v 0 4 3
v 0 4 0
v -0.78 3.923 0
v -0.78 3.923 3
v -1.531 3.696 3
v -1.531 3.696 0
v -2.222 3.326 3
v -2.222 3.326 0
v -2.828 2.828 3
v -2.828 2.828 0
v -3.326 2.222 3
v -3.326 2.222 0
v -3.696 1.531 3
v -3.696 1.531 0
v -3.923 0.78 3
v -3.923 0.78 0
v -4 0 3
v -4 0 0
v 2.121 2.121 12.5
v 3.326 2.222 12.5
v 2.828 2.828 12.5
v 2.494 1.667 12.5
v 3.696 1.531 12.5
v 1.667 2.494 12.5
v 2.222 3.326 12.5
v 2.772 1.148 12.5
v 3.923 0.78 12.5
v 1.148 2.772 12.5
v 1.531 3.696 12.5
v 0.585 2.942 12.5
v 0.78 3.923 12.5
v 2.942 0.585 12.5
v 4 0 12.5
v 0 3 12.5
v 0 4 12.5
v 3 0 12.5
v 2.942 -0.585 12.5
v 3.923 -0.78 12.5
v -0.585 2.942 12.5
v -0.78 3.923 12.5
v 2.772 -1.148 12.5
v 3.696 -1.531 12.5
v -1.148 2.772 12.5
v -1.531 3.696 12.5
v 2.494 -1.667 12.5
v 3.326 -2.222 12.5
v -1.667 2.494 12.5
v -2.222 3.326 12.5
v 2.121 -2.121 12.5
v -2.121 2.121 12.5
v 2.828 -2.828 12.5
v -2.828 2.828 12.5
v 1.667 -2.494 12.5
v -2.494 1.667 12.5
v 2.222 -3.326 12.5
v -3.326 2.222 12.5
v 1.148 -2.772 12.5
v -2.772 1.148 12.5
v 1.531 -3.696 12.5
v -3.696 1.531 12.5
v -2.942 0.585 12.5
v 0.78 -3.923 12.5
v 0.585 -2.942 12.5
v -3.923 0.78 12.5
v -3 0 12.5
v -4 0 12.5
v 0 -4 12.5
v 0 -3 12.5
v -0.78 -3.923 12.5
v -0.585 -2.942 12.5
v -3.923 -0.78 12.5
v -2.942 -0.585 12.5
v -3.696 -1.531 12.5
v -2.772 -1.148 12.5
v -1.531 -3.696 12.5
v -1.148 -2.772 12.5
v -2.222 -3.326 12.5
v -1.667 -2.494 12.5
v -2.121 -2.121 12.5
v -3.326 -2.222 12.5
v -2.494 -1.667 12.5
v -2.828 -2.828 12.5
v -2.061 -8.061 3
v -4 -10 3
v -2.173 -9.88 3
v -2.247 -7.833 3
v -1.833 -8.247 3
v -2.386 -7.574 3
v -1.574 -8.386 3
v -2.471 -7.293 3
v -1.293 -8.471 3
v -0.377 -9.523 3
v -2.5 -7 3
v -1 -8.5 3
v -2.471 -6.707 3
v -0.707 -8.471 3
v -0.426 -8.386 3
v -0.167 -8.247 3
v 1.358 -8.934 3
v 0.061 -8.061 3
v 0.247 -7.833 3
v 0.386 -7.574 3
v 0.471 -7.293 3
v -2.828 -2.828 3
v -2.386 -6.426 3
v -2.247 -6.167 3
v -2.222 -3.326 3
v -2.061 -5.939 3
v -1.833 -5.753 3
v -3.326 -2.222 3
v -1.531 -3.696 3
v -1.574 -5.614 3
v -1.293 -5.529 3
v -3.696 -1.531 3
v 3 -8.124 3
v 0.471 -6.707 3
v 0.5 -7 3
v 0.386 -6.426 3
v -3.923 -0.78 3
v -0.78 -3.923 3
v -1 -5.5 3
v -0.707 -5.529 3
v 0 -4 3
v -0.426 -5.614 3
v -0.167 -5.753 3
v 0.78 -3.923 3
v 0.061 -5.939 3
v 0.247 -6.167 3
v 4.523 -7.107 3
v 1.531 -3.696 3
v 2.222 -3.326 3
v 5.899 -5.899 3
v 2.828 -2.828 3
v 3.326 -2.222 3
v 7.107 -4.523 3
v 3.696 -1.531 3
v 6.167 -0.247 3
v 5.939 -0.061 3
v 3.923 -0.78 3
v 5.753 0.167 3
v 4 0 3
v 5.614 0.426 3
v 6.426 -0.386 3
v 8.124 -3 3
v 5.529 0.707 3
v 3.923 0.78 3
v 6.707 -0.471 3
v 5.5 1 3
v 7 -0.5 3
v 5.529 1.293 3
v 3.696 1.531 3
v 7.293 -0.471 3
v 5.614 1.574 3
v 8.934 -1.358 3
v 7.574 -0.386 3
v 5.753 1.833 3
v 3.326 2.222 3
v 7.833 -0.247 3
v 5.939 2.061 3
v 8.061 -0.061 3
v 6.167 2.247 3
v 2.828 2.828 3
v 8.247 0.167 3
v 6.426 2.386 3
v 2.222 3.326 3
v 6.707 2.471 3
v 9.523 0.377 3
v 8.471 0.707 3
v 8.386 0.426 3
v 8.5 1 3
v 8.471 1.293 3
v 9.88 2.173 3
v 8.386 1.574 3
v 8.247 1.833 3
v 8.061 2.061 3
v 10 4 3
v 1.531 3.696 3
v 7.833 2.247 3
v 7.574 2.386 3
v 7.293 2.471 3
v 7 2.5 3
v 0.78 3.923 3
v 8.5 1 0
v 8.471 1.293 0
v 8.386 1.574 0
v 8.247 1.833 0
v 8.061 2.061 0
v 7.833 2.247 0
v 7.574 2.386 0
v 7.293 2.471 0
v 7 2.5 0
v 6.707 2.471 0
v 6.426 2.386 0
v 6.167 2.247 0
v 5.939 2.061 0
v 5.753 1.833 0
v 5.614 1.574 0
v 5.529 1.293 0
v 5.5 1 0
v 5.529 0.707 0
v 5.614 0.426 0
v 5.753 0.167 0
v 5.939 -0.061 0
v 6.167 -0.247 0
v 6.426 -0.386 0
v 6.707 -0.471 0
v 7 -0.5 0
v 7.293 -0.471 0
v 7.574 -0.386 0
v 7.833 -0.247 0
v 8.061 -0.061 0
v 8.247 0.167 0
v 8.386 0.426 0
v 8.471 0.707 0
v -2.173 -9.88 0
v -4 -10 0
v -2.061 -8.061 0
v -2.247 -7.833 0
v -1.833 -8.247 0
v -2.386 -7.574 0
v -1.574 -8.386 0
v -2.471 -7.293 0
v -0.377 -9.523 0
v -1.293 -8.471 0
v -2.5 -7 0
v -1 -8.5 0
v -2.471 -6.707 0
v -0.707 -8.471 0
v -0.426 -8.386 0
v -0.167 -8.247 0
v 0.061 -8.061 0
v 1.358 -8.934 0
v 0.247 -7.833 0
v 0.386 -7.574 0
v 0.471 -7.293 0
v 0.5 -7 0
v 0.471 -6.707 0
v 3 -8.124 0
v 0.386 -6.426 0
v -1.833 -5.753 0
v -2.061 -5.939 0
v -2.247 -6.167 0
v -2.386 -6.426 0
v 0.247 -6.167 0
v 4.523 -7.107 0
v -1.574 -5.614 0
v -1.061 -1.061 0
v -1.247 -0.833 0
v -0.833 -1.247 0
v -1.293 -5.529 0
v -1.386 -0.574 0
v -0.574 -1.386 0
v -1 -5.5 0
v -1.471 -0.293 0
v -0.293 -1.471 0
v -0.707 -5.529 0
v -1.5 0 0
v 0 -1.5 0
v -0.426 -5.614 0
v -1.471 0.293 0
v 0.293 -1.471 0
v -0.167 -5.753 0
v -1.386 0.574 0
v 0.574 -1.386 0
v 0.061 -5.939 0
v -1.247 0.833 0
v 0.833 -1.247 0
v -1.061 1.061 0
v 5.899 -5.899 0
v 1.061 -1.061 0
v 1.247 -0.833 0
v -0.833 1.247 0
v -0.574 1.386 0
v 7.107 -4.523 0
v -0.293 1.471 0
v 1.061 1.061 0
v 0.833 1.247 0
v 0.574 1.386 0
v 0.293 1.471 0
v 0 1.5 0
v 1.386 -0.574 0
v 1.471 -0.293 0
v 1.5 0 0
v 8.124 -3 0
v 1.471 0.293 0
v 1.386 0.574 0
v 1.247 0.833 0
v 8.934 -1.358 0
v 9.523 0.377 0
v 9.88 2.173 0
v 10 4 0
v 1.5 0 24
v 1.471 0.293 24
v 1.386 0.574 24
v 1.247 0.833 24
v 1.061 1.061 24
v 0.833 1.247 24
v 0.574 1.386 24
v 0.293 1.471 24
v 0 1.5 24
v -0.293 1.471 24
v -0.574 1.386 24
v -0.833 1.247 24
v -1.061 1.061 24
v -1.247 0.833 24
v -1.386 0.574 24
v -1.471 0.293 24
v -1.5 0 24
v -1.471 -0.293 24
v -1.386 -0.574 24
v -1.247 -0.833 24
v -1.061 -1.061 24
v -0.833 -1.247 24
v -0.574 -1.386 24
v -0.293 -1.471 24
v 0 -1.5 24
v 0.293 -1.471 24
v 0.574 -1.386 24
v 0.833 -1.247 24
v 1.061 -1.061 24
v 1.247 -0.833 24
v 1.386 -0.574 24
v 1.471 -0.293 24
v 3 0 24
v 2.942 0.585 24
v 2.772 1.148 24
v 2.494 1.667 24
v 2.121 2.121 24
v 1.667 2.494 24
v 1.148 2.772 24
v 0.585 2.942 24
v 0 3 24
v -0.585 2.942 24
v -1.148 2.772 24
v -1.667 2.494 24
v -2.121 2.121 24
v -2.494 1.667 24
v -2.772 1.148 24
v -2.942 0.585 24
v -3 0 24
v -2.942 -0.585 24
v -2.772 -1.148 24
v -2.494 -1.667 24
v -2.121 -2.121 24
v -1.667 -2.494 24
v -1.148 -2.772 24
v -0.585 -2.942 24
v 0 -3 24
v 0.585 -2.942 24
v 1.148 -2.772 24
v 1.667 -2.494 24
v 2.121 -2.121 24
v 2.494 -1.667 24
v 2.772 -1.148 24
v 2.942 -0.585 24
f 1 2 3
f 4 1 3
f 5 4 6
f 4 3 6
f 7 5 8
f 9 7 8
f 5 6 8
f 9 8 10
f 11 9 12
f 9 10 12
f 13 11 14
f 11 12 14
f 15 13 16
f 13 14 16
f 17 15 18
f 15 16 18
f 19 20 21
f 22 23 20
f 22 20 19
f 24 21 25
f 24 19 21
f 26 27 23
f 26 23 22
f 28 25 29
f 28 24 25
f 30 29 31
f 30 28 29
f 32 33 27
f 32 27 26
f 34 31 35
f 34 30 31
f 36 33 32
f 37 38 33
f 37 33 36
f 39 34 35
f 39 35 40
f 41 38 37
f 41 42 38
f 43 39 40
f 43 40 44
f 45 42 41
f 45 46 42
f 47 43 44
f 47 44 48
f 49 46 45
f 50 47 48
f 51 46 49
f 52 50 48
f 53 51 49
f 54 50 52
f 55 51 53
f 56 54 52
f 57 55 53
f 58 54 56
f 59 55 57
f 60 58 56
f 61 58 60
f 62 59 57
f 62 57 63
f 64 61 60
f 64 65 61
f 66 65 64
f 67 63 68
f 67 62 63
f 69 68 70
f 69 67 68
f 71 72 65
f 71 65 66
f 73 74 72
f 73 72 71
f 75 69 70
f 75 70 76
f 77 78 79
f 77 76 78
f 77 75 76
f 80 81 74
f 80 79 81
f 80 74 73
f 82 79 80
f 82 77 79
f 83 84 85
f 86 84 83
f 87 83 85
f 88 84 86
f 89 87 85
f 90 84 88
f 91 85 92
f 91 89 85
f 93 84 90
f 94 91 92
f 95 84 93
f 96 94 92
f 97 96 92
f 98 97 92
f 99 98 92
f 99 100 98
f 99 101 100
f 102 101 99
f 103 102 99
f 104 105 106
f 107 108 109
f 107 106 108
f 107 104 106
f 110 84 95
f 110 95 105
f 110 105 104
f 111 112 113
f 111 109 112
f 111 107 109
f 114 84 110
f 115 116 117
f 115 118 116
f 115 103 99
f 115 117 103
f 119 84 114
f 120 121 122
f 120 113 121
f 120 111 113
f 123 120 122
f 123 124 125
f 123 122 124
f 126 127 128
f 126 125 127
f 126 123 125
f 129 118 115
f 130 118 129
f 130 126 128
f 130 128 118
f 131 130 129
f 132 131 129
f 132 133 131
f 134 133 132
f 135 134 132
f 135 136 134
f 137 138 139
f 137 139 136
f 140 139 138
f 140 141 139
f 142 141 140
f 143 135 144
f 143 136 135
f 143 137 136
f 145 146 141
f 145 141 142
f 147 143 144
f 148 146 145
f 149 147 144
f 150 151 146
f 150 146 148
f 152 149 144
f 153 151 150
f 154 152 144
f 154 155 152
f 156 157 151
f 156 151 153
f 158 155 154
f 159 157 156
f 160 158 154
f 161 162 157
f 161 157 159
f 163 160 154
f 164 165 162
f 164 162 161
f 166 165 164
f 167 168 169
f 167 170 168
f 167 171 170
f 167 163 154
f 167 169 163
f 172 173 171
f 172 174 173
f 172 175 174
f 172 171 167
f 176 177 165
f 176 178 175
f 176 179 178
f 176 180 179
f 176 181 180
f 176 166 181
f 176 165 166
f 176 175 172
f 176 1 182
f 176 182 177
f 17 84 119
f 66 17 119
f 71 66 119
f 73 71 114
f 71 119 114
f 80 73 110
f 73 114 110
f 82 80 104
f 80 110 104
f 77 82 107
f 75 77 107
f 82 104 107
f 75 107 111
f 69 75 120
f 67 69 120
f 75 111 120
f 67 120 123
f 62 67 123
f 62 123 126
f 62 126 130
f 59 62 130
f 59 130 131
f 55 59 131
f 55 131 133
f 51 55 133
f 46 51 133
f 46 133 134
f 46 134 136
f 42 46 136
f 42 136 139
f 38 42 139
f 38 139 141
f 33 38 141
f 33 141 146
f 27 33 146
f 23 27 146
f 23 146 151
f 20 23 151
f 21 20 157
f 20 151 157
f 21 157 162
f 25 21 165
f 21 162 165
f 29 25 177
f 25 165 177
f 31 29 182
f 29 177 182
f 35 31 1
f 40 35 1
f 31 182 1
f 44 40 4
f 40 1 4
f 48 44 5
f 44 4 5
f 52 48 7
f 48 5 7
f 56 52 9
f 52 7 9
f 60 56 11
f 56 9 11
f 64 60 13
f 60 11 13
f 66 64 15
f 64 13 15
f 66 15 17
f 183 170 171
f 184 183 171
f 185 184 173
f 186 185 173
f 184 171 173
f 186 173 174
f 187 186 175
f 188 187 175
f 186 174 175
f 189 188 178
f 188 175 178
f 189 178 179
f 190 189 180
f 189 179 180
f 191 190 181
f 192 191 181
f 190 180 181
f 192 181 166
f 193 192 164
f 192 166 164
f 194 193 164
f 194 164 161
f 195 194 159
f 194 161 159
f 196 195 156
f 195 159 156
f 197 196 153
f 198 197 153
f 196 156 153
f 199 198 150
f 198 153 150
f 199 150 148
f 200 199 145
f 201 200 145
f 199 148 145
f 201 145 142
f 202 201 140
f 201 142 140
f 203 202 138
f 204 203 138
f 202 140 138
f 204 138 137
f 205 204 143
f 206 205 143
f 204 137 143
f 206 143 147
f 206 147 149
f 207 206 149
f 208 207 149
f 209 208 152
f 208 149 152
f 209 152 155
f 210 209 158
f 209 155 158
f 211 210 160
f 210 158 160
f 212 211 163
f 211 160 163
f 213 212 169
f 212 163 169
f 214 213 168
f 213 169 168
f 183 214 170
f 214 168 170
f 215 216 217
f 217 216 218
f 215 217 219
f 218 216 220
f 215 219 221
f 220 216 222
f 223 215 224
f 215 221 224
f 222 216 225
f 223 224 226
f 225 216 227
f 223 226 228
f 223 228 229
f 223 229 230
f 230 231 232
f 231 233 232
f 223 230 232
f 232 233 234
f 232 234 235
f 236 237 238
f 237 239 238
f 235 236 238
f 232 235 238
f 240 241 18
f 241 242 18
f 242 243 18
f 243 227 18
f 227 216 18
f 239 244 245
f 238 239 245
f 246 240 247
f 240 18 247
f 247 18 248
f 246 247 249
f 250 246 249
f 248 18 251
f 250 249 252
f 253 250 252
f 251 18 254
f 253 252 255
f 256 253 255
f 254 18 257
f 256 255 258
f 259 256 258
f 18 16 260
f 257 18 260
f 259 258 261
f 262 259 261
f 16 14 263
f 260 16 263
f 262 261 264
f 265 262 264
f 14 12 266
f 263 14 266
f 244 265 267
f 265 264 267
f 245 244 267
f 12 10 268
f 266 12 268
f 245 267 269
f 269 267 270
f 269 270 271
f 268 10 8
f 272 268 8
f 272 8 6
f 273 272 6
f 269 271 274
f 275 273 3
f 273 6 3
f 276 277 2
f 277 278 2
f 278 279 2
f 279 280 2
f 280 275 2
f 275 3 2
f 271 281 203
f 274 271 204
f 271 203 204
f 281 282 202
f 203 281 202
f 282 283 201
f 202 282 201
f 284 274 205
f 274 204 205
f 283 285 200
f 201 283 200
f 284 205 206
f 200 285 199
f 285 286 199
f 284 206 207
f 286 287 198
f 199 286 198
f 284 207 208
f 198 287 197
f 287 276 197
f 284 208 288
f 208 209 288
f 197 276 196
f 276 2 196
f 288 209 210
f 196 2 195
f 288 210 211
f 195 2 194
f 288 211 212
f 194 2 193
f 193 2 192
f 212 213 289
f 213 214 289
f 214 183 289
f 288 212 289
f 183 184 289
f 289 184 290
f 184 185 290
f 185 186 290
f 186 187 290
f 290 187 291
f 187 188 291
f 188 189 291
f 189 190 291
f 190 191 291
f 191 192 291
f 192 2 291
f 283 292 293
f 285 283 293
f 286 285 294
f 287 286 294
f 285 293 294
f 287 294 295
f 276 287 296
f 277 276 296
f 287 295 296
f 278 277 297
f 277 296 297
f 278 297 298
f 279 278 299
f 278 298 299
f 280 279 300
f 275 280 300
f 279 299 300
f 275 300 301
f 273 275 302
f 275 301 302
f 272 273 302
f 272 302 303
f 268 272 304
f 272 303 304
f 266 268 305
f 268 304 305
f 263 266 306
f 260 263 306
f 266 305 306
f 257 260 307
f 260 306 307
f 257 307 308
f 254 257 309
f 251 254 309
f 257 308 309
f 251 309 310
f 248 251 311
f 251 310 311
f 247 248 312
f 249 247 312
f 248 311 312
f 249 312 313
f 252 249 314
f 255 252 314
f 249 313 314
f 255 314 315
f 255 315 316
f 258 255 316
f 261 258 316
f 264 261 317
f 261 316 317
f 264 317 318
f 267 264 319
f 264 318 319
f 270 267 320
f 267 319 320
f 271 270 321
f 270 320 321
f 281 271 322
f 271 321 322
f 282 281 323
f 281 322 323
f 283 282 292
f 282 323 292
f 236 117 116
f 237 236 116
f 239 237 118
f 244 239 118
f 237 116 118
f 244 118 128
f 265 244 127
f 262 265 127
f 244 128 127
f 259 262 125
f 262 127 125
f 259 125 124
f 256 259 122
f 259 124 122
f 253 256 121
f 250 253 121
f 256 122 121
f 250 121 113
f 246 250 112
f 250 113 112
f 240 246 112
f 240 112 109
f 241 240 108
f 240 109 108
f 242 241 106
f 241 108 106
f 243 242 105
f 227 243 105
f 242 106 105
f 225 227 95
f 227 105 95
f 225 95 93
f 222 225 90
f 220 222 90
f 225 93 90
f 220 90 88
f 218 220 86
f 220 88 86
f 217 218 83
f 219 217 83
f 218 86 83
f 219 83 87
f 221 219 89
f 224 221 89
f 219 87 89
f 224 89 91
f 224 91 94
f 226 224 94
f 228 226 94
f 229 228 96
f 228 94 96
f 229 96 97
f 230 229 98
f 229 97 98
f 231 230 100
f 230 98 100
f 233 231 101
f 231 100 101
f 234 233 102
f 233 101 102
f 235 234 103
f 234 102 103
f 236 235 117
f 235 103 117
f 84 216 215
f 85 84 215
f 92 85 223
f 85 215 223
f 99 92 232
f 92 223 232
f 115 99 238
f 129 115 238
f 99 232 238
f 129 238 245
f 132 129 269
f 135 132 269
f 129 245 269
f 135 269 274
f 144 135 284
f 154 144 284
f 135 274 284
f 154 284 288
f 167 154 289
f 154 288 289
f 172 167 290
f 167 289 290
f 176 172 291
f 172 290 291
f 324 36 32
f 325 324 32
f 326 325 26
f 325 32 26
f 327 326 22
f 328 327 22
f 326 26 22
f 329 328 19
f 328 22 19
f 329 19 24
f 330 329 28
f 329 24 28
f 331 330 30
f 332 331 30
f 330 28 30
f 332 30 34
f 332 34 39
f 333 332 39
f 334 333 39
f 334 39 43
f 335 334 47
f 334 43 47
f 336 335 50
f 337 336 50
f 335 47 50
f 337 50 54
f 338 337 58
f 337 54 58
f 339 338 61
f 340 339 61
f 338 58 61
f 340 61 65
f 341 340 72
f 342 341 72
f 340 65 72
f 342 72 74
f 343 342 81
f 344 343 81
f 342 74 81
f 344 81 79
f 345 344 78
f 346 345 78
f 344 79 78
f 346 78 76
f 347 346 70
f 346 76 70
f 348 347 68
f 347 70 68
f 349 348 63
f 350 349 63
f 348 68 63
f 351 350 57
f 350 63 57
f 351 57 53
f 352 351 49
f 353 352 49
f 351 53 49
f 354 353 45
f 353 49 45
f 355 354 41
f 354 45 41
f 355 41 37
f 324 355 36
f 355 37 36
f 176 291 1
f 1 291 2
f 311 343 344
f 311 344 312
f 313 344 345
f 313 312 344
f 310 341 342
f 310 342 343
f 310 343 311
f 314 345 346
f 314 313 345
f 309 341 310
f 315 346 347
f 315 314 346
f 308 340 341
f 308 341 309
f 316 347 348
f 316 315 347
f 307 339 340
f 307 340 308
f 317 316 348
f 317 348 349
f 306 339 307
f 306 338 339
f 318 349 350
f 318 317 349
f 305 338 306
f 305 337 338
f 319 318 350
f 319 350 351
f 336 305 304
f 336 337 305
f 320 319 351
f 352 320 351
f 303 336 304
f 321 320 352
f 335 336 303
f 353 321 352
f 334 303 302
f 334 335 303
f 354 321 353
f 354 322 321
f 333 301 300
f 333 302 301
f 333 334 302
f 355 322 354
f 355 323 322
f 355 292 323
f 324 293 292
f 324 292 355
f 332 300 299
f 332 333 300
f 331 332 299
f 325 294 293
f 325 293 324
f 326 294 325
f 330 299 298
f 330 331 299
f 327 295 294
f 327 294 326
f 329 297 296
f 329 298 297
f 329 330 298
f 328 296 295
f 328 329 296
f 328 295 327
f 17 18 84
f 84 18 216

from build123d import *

# Parameters (mm, degrees)
EXTRUDE1_DEPTH = 3
SKETCH2_R      = 4
EXTRUDE2_DEPTH = 9.5
SKETCH3_R      = 3
EXTRUDE3_DEPTH = 11.5
SKETCH4_R      = 1.5
EXTRUDE4_DEPTH = 24
SKETCH5_R      = 1.5
EXTRUDE5_DEPTH = 3


with BuildPart() as part:
    # Sketch1 → Extrude1 (new body)
    with BuildSketch(Plane.XY):
        with BuildLine():
            Line((10, 4), (0, 4))
            ThreePointArc((0, 4), (-2.828427125, 2.828427125), (-4, 0))
            Line((-4, 0), (-4, -10))
            ThreePointArc((-4, -10), (5.899494937, -5.899494937), (10, 4))
        make_face()
    extrude(amount=EXTRUDE1_DEPTH)

    # Sketch2 → Extrude2 (add)
    with BuildSketch(Plane.XY.offset(3)):
        with Locations(Location((0, 0, 0), (0, 0, 180))):
            Circle(SKETCH2_R)
    extrude(amount=EXTRUDE2_DEPTH)

    # Sketch3 → Extrude3 (add)
    with BuildSketch(Plane.XY.offset(12.5)):
        Circle(SKETCH3_R)
    extrude(amount=EXTRUDE3_DEPTH)

    # Sketch4 → Extrude4 (cut)
    with BuildSketch(Plane.XY.offset(24)):
        Circle(SKETCH4_R)
    extrude(amount=-EXTRUDE4_DEPTH, mode=Mode.SUBTRACT)

    # Sketch5 → Extrude5 (cut)
    with BuildSketch(Plane.XY.offset(3)):
        with Locations((7, 1)):
            Circle(SKETCH5_R)
        with Locations((-1, -7)):
            Circle(SKETCH5_R)
    extrude(amount=-EXTRUDE5_DEPTH, mode=Mode.SUBTRACT)


solid = part.part
